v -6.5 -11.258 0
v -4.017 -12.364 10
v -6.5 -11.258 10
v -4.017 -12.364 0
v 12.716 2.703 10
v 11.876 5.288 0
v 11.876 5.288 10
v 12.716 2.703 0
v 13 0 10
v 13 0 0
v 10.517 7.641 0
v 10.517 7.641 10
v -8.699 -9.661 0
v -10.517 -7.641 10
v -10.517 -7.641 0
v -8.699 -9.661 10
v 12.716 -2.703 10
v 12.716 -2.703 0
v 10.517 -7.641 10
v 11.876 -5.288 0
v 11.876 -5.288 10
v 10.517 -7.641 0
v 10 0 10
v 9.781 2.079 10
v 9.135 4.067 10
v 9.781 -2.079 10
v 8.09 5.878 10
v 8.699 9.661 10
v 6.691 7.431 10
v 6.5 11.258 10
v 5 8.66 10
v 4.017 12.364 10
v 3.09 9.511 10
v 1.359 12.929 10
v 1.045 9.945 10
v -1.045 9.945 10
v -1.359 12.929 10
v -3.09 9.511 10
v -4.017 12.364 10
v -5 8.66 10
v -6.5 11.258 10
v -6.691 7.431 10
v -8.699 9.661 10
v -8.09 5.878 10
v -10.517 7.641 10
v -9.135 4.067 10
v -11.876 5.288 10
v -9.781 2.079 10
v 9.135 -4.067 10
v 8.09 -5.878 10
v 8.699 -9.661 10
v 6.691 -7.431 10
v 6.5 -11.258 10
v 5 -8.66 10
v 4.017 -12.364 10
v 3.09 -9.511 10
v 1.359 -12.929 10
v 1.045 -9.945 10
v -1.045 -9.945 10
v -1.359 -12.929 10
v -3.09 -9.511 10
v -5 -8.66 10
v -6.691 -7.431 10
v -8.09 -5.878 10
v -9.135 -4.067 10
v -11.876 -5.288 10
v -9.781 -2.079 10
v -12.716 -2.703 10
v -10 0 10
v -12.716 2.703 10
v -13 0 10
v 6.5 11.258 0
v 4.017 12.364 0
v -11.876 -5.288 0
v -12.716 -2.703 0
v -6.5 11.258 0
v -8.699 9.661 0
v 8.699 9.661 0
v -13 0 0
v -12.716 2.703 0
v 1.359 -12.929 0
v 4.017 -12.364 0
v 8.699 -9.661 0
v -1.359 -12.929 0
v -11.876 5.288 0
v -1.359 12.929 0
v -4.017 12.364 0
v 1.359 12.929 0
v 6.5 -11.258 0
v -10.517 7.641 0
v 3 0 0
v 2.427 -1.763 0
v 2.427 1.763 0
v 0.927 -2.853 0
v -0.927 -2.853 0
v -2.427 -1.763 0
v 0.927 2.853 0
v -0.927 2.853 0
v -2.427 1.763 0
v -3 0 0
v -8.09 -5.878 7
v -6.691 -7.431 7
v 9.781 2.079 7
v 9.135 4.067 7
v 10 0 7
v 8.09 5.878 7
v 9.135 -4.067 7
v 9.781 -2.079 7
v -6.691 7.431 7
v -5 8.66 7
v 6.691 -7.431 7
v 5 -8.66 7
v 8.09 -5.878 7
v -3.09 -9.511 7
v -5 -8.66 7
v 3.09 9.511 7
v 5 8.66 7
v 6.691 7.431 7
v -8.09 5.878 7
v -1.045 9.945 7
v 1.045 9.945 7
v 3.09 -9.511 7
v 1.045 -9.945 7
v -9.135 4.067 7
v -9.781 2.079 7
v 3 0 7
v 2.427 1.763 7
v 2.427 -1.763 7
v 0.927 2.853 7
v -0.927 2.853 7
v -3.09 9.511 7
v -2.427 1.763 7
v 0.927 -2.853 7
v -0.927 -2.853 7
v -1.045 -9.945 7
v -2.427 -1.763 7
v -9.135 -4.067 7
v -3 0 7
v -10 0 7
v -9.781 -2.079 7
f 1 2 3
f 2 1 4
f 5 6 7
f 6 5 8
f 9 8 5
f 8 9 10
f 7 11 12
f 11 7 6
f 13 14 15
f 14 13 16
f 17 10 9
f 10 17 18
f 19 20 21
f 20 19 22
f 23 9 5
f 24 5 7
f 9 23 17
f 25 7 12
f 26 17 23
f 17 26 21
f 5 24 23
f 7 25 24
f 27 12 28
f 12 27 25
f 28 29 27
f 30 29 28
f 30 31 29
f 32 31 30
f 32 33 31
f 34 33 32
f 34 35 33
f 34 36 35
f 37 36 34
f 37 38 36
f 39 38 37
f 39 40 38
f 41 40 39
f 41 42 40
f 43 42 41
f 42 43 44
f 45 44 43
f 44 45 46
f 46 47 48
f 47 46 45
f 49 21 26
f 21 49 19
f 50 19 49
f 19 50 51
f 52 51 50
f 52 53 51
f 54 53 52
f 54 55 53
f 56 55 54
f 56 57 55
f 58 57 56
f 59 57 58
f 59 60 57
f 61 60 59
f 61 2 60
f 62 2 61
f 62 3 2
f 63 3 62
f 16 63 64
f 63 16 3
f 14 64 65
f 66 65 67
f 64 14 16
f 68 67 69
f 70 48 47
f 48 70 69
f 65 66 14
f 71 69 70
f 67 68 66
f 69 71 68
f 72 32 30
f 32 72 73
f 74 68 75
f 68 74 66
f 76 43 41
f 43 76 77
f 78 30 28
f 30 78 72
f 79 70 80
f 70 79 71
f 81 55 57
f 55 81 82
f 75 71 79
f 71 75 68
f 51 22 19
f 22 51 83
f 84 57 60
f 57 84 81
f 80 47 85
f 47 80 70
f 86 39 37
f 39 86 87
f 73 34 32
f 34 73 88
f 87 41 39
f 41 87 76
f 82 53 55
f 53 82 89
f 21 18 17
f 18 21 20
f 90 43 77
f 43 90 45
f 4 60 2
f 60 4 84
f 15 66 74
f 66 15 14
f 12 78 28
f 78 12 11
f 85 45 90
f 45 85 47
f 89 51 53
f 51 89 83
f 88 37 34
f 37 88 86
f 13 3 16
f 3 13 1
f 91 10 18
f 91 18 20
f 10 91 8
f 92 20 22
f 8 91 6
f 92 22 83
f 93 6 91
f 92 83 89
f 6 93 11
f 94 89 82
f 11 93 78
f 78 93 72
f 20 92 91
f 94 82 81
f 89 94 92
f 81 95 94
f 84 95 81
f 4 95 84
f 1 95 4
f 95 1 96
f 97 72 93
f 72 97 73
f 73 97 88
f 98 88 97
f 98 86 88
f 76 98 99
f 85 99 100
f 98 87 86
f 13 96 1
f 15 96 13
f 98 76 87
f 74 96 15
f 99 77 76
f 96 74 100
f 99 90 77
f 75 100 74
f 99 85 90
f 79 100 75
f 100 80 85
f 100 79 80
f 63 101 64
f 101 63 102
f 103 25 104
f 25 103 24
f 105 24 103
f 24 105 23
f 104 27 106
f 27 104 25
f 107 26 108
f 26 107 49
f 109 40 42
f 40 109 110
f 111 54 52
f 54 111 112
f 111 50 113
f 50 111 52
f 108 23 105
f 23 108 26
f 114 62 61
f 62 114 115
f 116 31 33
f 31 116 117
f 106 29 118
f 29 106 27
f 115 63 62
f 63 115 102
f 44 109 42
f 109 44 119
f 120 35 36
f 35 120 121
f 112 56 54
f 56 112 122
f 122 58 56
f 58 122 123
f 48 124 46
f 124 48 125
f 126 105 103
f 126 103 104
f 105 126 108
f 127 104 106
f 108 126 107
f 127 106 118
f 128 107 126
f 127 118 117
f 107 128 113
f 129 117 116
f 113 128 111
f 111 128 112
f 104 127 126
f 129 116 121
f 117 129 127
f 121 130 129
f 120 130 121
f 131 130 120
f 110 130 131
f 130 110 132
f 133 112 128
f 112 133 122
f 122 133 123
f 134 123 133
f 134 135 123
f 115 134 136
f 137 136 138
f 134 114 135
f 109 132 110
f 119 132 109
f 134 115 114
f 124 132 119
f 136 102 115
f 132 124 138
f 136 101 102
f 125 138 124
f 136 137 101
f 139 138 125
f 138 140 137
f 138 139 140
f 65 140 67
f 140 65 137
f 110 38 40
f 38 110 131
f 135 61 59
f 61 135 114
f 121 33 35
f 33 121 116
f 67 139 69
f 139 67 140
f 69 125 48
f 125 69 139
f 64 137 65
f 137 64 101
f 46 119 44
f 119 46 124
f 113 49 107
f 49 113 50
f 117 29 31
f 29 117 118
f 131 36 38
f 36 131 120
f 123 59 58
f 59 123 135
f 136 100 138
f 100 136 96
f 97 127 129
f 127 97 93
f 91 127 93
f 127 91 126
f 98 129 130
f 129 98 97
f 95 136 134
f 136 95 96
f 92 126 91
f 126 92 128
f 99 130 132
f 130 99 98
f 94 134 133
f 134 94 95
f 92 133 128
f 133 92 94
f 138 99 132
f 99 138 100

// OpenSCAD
module wheel(tireRadius=13, tireWidth=10, rimDepth=3, rimInset=3, axleRadius=3) {
    
    treadWidth = 1;
    
    module tires() {
        cylinder(r=tireRadius, h=tireWidth);
    }
            
    module rim() {
        translate([0, 0, tireWidth - rimDepth])
        cylinder(r=tireRadius - rimInset, h=tireWidth);
    }
    
    module treadCanals() {
        for (offsetZ=[0.25, 0.75]) {
            translate([0, 0, tireWidth*offsetZ])
                difference() {
                    cylinder(r=tireRadius*2, h=treadWidth, center=true);
                    translate([0, 0, -1])
                        cylinder(r=tireRadius-1, h=3, center=true);
                }
        }
    }
    
    difference() {
        difference() {
            difference() {
                tires();
                rim();
            }
    
            // tunnel for axles
            cylinder(r=axleRadius, h=tireWidth*4, center=true);
        }
        
        // TODO: finish tire tread
        //tread
        //treadCanals();
        
        //#treadTeethLarge(rot=45);
        //#treadTeethLarge(rot=-45);
        
        /*for (rotateZ=[10, 20, 30, 40, 50, 60, 70, 80, 90, 100, 110, 120, 130, 140, 150, 160, 170, 180, 190, 200, 210, 220, 230, 240, 250, 260, 270, 280, 290, 300, 310, 320, 330, 340, 350, 360])
            rotate([0, 0, rotateZ])
                translate([0, tireRadius, tireWidth*0.125 - treadWidth*0.25])
                    treadTeethSmall(rot=45);
        
        for (rotateZ=[10, 20, 30, 40, 50, 60, 70, 80, 90, 100, 110, 120, 130, 140, 150, 160, 170, 180, 190, 200, 210, 220, 230, 240, 250, 260, 270, 280, 290, 300, 310, 320, 330, 340, 350, 360])
            rotate([0, 0, rotateZ])
                translate([0, tireRadius, tireWidth*0.875 - treadWidth*0.25])
                    treadTeethSmall(rot=-45);*/
        
    
    }
    
    module treadTeethSmall(rot=45) {
        rotate([0, rot, 0])
            cube([0.5, 1, 1], center=true);
    }
    
    module treadTeethLarge(rot=45) {
        translate([0, tireRadius, tireWidth*0.5])
        rotate([0, rot, 0])
            cube([0.5, 1, 3], center=true);
    }
    
    
    
}

wheel();
